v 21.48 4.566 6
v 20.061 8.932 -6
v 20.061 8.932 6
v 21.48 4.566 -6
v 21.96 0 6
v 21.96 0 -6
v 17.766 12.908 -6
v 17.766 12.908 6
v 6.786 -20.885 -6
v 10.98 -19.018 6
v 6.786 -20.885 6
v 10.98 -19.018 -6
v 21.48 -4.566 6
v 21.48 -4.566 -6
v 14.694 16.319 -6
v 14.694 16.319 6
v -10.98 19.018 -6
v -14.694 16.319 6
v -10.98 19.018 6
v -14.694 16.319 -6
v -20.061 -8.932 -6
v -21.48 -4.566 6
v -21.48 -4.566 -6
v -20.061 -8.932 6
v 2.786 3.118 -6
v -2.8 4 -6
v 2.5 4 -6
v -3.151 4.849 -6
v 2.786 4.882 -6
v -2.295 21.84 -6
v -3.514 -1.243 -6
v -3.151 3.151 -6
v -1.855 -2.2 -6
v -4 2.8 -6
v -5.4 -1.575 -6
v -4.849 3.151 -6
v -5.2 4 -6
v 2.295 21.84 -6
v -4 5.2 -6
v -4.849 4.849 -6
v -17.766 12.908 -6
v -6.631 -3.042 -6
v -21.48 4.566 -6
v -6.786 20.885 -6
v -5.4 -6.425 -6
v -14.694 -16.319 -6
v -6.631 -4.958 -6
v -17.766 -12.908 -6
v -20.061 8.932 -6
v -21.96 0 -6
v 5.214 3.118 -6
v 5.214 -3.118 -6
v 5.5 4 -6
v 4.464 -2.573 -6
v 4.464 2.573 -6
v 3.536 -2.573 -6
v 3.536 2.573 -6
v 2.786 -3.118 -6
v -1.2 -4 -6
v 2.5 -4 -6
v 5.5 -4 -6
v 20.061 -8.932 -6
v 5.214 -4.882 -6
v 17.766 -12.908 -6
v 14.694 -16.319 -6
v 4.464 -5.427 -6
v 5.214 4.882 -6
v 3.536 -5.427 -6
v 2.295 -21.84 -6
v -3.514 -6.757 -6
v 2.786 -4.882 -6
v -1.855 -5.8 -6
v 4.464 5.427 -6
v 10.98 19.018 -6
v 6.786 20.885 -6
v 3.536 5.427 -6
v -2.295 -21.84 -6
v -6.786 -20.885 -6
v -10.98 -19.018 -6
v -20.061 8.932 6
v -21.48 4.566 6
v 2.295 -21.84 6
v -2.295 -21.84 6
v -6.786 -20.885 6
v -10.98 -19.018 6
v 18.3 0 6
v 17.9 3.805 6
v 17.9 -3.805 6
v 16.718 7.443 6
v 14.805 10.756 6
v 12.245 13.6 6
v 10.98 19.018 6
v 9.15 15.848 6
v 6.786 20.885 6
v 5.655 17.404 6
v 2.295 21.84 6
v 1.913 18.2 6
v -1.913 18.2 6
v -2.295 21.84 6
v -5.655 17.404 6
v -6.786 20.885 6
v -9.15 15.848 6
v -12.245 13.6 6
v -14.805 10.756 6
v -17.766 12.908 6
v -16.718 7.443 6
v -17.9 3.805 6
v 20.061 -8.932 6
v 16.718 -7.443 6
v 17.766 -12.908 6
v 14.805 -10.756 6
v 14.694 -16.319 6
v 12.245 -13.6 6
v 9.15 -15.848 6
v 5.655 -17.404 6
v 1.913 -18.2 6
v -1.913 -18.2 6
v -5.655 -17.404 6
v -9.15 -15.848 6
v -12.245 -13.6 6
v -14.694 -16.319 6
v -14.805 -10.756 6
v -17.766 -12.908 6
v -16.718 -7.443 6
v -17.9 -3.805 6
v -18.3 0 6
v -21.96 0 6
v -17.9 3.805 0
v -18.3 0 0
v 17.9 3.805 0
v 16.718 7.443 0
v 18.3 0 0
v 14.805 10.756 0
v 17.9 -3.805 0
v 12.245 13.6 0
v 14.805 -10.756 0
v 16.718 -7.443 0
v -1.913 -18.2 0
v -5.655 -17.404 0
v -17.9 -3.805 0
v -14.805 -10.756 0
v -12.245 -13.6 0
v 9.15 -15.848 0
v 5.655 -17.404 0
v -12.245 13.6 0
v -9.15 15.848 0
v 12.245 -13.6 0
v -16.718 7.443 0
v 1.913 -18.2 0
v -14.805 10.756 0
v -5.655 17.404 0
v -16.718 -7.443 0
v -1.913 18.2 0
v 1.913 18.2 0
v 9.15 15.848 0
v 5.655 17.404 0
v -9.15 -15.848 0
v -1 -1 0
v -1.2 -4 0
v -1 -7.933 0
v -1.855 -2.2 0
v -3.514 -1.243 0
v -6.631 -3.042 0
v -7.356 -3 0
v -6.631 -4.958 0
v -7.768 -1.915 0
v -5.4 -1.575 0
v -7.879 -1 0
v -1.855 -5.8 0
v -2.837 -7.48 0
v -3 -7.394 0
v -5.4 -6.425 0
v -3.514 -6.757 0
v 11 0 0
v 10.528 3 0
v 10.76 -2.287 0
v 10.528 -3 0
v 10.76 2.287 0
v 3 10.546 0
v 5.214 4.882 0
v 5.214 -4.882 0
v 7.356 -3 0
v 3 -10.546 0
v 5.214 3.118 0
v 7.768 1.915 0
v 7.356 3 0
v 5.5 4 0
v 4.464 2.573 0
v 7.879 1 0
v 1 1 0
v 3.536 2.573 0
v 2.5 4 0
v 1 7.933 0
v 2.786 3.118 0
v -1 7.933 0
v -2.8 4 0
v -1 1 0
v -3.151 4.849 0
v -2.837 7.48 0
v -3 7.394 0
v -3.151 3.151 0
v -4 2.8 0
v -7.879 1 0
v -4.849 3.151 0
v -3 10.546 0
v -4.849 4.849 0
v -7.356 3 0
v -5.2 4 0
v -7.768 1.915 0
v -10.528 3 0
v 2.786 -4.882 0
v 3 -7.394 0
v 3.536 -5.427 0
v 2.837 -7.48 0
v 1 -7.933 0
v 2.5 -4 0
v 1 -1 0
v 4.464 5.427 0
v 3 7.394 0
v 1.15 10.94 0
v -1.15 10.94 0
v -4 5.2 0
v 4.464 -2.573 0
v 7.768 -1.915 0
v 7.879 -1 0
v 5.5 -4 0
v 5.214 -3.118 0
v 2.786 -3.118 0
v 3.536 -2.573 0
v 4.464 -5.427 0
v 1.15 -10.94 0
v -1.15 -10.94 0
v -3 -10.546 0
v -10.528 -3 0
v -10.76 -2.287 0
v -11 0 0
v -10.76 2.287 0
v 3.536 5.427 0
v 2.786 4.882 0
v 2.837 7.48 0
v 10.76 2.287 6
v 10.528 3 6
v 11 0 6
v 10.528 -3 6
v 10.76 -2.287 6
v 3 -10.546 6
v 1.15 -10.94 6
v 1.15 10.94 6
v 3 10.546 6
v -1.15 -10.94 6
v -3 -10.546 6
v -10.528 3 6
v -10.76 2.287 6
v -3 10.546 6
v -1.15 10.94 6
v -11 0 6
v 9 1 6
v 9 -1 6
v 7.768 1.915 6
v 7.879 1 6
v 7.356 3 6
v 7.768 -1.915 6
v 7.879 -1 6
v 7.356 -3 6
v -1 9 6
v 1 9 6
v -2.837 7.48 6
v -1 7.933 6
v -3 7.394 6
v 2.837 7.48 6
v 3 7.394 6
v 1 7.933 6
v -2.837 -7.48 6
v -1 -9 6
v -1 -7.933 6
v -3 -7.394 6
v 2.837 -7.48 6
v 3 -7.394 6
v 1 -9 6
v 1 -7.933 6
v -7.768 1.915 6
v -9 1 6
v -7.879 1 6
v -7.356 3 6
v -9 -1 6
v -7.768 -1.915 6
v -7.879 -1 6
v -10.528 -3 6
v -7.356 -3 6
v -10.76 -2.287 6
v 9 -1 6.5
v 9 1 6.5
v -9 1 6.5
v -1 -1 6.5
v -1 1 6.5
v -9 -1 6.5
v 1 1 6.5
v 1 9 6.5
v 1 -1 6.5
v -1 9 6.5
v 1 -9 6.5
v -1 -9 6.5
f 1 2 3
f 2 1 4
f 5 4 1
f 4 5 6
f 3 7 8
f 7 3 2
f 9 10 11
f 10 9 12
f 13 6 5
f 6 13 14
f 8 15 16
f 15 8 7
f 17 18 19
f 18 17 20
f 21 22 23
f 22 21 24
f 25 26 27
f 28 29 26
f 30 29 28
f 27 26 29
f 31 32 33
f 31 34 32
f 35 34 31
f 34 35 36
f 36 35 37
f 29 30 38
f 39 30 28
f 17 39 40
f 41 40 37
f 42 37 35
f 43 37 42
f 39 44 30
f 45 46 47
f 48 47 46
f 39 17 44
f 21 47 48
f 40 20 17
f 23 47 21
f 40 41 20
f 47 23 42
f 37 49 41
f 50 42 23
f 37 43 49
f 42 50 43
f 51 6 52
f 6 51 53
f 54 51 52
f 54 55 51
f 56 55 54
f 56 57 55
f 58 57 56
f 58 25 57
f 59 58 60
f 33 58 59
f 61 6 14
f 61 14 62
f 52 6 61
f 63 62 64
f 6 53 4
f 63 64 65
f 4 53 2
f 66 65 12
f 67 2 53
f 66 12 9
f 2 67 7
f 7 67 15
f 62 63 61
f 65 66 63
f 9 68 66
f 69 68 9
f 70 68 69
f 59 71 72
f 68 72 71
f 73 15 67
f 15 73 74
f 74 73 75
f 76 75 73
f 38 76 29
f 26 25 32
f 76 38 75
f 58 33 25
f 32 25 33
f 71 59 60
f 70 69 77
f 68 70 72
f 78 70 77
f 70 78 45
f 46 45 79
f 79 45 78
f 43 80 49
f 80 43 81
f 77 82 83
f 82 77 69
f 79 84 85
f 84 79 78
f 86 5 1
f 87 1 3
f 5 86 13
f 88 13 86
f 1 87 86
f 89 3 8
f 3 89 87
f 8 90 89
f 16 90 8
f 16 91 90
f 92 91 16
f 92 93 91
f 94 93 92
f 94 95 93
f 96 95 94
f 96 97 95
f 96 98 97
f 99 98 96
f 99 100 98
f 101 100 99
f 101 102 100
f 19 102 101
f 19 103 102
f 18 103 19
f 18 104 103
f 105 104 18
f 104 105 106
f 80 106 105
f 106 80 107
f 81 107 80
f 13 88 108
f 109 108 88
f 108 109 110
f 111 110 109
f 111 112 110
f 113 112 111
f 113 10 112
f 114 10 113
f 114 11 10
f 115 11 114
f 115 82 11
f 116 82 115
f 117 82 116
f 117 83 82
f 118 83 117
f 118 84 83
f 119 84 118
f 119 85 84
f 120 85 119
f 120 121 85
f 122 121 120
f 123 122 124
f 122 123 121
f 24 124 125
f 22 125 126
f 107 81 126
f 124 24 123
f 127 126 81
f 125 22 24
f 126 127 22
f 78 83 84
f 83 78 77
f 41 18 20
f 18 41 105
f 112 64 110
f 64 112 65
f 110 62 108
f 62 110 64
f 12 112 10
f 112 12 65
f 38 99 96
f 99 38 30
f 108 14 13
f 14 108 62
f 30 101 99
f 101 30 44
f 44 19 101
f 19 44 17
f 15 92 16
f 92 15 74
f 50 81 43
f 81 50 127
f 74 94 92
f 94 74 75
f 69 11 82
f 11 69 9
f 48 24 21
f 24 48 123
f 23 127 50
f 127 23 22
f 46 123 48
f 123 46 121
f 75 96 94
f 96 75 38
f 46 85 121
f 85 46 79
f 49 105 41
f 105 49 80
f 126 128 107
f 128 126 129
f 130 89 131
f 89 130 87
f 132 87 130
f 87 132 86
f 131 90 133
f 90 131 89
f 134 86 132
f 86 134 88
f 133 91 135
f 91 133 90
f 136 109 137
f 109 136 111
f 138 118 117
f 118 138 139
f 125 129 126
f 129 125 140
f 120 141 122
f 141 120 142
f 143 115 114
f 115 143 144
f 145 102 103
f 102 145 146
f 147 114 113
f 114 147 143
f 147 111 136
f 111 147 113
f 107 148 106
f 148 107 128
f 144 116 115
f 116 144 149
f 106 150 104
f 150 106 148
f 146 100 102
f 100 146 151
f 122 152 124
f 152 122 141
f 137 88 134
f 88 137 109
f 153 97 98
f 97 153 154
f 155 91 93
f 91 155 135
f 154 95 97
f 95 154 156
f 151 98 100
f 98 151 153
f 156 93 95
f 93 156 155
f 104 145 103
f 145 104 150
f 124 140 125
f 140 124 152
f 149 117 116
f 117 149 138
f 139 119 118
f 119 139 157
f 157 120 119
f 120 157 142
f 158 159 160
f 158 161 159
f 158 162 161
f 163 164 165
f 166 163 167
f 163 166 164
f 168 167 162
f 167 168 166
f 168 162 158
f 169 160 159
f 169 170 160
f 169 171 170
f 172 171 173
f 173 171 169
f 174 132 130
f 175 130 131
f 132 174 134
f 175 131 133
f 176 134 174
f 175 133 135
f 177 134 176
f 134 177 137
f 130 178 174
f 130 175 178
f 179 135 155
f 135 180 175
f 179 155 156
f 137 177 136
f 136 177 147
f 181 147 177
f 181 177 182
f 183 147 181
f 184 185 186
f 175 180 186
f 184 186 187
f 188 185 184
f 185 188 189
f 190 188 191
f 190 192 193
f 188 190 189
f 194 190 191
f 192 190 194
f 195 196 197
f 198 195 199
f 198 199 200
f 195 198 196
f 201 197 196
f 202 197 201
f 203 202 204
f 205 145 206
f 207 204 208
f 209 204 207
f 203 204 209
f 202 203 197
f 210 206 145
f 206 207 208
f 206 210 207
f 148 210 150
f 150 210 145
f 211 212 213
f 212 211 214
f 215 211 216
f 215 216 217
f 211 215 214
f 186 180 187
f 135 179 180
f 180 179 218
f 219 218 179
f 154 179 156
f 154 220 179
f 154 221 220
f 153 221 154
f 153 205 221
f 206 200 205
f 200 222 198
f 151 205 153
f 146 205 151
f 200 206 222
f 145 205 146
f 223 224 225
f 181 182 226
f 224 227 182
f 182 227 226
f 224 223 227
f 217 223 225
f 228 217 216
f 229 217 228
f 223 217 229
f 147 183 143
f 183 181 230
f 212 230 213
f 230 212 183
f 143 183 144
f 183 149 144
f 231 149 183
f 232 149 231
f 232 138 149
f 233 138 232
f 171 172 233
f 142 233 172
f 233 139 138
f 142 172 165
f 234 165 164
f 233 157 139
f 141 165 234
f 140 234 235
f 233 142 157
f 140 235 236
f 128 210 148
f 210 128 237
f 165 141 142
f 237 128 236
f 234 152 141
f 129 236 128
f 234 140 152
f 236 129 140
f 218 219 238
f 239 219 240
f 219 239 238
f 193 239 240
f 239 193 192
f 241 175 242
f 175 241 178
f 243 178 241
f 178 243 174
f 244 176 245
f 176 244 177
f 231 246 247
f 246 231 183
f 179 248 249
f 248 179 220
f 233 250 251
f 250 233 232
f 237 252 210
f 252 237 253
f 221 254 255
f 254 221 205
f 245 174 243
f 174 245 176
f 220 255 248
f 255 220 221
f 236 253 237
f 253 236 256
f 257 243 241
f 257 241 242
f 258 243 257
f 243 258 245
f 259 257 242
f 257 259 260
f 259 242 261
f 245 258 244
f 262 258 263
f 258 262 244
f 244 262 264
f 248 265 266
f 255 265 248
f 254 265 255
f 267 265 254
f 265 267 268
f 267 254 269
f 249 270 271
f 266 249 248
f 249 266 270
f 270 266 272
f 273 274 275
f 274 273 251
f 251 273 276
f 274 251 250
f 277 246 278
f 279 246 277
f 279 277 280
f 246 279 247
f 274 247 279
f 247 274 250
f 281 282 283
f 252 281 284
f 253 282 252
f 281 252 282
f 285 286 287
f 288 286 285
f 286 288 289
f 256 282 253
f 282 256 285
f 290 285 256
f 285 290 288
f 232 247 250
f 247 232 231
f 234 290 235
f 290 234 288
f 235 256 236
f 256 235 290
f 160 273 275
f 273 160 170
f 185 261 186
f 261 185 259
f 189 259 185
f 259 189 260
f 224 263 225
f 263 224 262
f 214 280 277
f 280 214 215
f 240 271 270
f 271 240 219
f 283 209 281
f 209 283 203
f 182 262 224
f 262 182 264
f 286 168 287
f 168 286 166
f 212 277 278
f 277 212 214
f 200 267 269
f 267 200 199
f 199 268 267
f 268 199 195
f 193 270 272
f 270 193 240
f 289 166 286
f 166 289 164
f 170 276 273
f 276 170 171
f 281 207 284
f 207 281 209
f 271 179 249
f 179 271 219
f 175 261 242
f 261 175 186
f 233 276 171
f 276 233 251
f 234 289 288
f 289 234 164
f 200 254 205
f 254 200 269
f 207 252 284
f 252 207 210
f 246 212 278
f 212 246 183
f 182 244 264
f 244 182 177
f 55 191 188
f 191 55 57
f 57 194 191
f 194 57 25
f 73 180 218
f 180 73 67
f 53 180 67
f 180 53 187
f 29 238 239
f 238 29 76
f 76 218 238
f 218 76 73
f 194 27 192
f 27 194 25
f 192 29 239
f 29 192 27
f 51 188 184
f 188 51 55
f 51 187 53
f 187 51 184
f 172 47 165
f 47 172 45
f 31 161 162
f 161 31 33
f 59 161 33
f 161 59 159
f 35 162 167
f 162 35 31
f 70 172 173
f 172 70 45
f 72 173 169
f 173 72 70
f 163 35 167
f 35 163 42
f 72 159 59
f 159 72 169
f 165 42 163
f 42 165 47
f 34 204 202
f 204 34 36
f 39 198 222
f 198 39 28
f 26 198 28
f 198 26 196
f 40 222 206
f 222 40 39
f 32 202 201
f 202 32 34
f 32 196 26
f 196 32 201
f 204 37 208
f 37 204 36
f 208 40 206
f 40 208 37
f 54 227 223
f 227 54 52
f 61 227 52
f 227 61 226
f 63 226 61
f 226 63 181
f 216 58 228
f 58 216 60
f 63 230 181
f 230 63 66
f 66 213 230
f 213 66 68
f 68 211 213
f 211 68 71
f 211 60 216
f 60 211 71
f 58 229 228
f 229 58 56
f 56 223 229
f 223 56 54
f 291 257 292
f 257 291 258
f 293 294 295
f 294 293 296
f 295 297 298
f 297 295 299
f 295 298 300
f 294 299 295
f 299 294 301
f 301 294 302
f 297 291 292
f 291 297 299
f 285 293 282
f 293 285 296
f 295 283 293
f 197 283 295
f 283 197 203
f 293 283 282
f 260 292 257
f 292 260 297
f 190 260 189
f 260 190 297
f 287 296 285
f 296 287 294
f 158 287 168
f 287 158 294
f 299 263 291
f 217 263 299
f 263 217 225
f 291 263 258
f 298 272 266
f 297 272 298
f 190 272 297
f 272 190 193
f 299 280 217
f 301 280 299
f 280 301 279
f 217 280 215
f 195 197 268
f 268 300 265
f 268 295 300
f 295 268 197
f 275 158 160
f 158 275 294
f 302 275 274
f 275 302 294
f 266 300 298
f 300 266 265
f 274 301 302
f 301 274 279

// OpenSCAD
// 250mL
insideradius = 11;
outsideradius = 18.3;

// 100mL
//insideradius = 9.3;
//outsideradius = 16.1;

// Loose fitting
//insideradius = 9;
//outsideradius = 16.5;
height = 12;
inletradius = 1.5;
filterradius= 2.8;
inducerradius = 1.2;
sampleradius = 1.5;
c0 = 14;
t0 = 10;  // tab spacing
tt = 3;   // tab thickness
i0 = 4;  //inlet spacing

module cross() {
   cube([7+insideradius,2,height-3],center=true);
   cube([2,7+insideradius,height-3],center=true);
}

module base(size) {

    difference() {
     cylinder(r=outsideradius+(outsideradius/5),
            h=size,center=true);
     translate([0,0,size/2])
        cylinder(r=outsideradius,h=size,center=true);
    } 
}
module tabs(size) {
    difference() {
     cylinder(r=insideradius,h=size,center=true);
     translate([0,0,size/2])
        cylinder(r=insideradius-tt,h=size,center=true);
     translate([t0,t0,0])
		    cube([c0,c0,height+2],center=true);
     translate([-t0,-t0,0])
		    cube([c0,c0,height+2],center=true);
     translate([-t0,t0,0])
		    cube([c0,c0,height+2],center=true);
     translate([t0,-t0,0])
		    cube([c0,c0,height+2],center=true);
    } 
}
module cap() {
	base(height);
 // rotate([0,0,45])
    tabs(height);
}
module septa() {
     difference() {
        cap();
        translate([i0,i0,0])
			      cylinder(r=inletradius,h=30,center=true,$fn=10);
        translate([-i0,-i0,0])
			      cylinder(r=filterradius,h=30,center=true);
        translate([-i0,i0,0])
			      cylinder(r=inducerradius,h=30,center=true,$fn=8);
        translate([i0,-i0,0])
			      cylinder(r=sampleradius,h=30,center=true,$fn=10);

     }
}
septa();
translate([0,0,2]) cross();
